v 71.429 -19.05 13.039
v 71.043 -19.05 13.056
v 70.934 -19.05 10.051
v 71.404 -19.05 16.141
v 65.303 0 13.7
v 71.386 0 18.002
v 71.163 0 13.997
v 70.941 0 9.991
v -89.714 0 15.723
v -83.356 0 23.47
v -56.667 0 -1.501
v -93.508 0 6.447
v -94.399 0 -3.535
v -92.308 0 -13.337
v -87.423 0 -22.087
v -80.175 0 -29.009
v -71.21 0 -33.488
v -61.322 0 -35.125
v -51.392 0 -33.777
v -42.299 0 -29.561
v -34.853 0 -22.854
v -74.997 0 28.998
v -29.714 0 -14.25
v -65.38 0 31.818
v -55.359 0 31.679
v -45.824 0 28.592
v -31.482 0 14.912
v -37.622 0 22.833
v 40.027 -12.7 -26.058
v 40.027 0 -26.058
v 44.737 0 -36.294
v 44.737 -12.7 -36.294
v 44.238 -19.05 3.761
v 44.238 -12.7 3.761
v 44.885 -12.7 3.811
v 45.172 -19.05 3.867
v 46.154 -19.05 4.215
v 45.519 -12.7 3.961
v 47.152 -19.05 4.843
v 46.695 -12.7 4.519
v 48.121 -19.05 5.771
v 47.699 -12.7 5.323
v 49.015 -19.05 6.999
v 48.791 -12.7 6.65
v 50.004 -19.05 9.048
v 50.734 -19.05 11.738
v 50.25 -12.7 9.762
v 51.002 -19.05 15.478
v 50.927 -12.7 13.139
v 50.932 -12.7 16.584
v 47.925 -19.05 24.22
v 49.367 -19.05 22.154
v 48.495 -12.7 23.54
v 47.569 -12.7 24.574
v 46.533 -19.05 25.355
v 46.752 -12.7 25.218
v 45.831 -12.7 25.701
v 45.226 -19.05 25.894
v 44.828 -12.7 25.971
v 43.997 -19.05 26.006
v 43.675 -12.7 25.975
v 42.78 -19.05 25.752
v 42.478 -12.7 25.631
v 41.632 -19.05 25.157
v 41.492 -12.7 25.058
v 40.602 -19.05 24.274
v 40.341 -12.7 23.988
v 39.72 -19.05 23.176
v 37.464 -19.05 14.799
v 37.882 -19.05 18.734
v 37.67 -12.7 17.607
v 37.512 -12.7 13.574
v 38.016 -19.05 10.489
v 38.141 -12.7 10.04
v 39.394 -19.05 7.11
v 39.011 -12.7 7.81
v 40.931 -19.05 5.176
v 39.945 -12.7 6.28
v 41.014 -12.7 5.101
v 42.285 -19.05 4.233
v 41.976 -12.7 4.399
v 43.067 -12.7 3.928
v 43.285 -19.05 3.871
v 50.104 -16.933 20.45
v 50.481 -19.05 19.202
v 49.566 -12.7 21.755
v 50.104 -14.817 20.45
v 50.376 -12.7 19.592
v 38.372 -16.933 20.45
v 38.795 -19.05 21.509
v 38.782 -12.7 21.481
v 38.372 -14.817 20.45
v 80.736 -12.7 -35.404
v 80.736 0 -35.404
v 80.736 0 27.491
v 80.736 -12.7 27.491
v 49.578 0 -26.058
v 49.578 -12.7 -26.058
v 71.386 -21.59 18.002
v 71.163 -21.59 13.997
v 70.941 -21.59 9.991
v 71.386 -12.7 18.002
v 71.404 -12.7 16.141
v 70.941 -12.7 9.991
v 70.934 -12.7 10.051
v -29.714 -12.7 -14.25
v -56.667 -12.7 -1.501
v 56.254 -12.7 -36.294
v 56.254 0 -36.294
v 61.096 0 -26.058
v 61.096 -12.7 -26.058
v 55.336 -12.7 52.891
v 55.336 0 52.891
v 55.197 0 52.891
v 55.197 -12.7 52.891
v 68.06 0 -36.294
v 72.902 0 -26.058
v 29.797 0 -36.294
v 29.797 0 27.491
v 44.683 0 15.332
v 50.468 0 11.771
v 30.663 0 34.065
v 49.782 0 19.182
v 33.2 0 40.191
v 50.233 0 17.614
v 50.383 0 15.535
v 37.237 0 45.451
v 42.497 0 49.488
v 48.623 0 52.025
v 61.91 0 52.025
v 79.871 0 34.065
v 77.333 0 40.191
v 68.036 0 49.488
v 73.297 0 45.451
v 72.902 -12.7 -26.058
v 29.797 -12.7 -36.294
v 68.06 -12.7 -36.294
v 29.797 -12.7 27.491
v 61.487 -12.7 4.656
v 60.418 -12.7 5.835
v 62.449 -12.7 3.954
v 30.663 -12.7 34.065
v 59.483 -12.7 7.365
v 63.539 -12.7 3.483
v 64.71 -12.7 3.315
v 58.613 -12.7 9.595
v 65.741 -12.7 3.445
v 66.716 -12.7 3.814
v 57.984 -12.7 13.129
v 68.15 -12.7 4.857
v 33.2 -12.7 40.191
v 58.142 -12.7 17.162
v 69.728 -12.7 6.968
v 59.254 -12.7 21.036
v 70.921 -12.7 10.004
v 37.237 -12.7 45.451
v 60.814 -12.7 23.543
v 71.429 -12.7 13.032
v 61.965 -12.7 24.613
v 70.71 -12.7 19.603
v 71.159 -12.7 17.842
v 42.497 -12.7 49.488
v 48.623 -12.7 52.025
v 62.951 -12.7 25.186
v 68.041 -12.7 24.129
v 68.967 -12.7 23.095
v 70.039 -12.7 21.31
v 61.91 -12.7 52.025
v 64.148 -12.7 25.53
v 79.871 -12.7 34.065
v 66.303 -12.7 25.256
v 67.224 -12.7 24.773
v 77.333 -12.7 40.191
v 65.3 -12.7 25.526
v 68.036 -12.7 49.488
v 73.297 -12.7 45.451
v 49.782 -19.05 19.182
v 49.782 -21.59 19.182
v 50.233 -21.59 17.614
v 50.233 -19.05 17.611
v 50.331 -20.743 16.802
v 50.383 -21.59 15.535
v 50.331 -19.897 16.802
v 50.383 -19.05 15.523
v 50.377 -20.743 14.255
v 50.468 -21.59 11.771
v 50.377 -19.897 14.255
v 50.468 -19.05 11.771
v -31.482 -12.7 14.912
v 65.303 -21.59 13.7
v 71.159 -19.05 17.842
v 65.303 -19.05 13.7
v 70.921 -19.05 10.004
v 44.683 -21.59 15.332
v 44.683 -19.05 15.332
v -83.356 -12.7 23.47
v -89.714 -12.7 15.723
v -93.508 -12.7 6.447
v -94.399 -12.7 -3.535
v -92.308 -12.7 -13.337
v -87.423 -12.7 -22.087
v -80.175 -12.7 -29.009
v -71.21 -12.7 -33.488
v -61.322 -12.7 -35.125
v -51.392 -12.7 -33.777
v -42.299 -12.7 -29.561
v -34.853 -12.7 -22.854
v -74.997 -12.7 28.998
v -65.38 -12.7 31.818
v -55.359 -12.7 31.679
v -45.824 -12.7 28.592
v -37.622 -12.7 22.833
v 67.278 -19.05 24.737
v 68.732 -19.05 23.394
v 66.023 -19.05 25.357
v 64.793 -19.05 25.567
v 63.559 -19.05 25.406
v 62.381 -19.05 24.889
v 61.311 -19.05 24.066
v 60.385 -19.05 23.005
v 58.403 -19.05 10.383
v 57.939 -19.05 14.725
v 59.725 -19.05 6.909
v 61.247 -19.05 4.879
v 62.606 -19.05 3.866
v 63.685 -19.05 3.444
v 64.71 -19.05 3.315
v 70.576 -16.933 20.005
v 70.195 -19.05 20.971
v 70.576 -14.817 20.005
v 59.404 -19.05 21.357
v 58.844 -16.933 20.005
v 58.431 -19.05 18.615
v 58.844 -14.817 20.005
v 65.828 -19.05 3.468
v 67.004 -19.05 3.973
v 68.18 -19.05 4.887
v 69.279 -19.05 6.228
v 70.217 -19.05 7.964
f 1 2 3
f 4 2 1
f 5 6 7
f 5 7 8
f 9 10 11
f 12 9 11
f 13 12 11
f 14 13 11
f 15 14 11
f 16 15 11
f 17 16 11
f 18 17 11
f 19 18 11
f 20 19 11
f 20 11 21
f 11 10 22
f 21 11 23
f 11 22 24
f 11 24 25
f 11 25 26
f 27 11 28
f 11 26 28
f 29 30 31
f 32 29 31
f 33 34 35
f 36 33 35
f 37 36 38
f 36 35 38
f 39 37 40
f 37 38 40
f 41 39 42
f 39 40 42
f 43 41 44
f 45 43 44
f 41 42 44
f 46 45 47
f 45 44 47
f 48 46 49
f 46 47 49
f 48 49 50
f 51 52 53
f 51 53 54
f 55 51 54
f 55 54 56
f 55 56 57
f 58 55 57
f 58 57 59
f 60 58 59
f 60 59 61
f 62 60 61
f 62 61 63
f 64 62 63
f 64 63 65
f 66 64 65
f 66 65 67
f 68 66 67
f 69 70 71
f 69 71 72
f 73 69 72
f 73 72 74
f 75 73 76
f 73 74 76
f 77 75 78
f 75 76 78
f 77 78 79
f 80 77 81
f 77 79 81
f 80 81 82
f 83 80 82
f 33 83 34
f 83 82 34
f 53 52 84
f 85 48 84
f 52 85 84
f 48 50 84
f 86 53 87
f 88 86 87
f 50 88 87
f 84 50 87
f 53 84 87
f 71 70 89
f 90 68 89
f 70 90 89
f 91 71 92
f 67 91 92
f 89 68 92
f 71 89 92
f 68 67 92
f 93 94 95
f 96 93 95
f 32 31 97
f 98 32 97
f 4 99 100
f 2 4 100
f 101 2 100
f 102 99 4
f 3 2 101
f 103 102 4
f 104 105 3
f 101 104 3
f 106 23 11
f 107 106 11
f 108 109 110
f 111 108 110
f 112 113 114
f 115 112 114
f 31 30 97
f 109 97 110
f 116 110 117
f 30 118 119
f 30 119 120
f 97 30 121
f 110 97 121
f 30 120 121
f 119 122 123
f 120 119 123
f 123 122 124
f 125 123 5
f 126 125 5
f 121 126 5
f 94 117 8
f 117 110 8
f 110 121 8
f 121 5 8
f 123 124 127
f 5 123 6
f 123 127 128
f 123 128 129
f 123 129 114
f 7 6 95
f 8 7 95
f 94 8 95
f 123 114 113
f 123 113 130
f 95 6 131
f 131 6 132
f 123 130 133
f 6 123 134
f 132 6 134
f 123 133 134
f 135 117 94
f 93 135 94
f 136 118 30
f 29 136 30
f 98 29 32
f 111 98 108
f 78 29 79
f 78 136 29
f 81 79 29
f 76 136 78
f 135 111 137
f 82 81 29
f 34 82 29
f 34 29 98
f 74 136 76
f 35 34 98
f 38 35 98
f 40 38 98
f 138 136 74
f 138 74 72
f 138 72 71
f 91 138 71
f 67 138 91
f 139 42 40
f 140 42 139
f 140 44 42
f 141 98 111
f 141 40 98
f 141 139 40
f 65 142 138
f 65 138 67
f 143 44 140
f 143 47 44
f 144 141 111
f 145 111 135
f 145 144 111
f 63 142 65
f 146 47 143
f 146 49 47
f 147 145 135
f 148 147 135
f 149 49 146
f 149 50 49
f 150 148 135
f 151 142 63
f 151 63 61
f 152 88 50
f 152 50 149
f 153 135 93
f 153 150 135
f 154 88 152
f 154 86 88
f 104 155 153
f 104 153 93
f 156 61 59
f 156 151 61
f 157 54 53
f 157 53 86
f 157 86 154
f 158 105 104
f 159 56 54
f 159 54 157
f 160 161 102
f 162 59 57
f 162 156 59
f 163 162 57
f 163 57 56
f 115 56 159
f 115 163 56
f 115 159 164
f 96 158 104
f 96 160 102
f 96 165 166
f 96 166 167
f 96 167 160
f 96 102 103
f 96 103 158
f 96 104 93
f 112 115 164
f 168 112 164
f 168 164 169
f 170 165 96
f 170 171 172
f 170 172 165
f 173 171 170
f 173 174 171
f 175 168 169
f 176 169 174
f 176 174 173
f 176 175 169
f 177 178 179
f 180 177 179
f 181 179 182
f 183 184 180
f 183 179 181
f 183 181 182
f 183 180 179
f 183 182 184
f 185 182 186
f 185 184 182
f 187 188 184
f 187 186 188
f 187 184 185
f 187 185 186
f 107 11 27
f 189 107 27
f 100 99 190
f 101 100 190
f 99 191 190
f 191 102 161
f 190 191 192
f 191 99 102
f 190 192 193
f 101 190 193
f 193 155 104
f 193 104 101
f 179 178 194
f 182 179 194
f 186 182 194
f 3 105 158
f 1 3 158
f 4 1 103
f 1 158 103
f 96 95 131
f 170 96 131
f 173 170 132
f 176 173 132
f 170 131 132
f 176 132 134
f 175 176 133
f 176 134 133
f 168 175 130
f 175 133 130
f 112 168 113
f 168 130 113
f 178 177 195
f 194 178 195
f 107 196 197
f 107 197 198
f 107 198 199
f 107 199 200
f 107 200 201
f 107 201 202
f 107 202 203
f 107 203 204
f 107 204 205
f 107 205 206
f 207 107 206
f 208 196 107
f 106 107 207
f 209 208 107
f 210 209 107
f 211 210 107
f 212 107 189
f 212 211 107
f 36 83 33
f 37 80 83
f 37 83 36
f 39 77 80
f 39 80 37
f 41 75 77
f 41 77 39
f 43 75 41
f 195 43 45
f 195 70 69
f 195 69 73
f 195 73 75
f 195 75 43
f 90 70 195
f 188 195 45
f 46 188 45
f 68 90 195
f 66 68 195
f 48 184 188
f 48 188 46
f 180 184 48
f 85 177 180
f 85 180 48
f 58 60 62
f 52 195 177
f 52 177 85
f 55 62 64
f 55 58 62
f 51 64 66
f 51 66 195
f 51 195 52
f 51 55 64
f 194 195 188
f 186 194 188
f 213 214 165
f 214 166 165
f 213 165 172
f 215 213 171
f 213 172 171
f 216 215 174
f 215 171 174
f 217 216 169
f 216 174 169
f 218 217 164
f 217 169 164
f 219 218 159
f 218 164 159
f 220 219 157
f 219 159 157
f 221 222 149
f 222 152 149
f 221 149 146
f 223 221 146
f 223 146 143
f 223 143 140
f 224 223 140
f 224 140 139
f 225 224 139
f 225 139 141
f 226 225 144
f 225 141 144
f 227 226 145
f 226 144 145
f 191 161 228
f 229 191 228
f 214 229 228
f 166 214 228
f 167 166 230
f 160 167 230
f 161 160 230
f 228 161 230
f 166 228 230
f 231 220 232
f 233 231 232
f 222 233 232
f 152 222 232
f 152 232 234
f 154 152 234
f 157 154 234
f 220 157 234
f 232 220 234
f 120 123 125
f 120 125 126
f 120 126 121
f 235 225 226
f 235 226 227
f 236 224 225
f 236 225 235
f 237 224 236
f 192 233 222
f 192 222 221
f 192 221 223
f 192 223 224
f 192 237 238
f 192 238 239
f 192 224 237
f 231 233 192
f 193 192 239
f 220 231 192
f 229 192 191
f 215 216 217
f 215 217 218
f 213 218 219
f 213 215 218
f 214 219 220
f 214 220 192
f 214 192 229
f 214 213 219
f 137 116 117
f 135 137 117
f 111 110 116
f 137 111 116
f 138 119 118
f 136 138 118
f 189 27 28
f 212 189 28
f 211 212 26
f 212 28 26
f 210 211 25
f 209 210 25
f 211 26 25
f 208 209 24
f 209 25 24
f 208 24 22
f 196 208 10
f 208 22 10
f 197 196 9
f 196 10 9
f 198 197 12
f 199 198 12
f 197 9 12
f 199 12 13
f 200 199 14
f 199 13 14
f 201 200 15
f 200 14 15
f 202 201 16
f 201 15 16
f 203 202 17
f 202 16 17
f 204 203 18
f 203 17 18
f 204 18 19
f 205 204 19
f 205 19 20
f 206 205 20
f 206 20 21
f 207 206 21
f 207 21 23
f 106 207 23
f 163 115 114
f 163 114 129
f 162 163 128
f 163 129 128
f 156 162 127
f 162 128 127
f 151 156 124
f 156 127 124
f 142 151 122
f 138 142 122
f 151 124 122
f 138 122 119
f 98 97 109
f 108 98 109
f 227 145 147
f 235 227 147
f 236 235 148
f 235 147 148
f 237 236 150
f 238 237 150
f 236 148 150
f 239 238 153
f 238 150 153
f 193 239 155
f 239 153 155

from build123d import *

# Parameters (mm, degrees)
F1_DEPTH = 12.7
F3_DEPTH = 19.05
F5_DEPTH = 21.59


with BuildPart() as f1:
    # F0 (on Front) → F1 (new body)
    with BuildSketch(Plane.XZ):
        with BuildLine():
            Line((-56.667093, -1.500984), (-31.481724, 14.912394))
            ThreePointArc((-31.481724, 14.912394), (-94.398652, -3.535317), (-29.714329, -14.249616))
            Line((-29.714329, -14.249616), (-56.667093, -1.500984))
        make_face()
        with BuildLine():
            Line((55.336218, 52.890558), (55.1973, 52.890558))
            ThreePointArc((55.1973, 52.890558), (37.236788, 45.451071), (29.7973, 27.490558))
            Line((29.7973, 27.490558), (29.7973, -35.403918))
            Line((29.7973, -35.403918), (29.7973, -36.294021))
            Line((29.7973, -36.294021), (40.027231, -26.05786))
            Line((40.027231, -26.05786), (44.7366, -36.294021))
            Line((44.7366, -36.294021), (49.578294, -26.05786))
            Line((49.578294, -26.05786), (56.254052, -36.294021))
            Line((56.254052, -36.294021), (61.095746, -26.05786))
            Line((61.095746, -26.05786), (68.0599, -36.294021))
            Line((68.0599, -36.294021), (72.901594, -26.05786))
            Line((72.901594, -26.05786), (80.736218, -35.403918))
            Line((80.736218, -35.403918), (80.736218, 27.490558))
            ThreePointArc((80.736218, 27.490558), (73.29673, 45.451071), (55.336218, 52.890558))
        make_face()
    extrude(amount=F1_DEPTH)

    # F2 (on Front) → F3 (join)
    with BuildSketch(Plane.XZ):
        with BuildLine():
            add(Edge.make_bspline(
                [(44.237684, 3.76052), (55.96965, 3.76052), (50.103667, 20.44991), (44.237684, 37.139299), (38.371702, 20.44991), (32.505719, 3.76052), (44.237684, 3.76052)],
                knots=[0, 0, 0, 2.094395, 2.094395, 4.18879, 4.18879, 6.283185, 6.283185, 6.283185], degree=2, weights=[1, 0.5, 1, 0.5, 1, 0.5, 1]))
        make_face()
        with BuildLine():
            add(Edge.make_bspline(
                [(64.710006, 3.315472), (76.441971, 3.315472), (70.575989, 20.004861), (64.710006, 36.694251), (58.844023, 20.004861), (52.978041, 3.315472), (64.710006, 3.315472)],
                knots=[0, 0, 0, 2.094395, 2.094395, 4.18879, 4.18879, 6.283185, 6.283185, 6.283185], degree=2, weights=[1, 0.5, 1, 0.5, 1, 0.5, 1]))
        make_face()
    extrude(amount=F3_DEPTH)

    # F4 (on Front) → F5 (join)
    with BuildSketch(Plane.XZ):
        with BuildLine():
            add(Edge.make_bspline(
                [(49.78234, 19.181514), (50.765101, 16.963683), (50.171696, 14.14503), (50.468396, 11.771427)],
                knots=[0, 0, 0, 0, 7.441778, 7.441778, 7.441778, 7.441778], degree=3))
            Line((49.78234, 19.181514), (44.682741, 15.331832))
            Line((44.682741, 15.331832), (50.468396, 11.771427))
        make_face()
        with BuildLine():
            add(Edge.make_bspline(
                [(71.385764, 18.002136), (71.682464, 15.628533), (70.644017, 12.364828), (70.940718, 9.991226)],
                knots=[0, 0, 0, 0, 8.023263, 8.023263, 8.023263, 8.023263], degree=3))
            Line((71.385764, 18.002136), (65.303417, 13.699983))
            Line((65.303417, 13.699983), (70.940718, 9.991226))
        make_face()
    extrude(amount=F5_DEPTH)


solid = f1.part
